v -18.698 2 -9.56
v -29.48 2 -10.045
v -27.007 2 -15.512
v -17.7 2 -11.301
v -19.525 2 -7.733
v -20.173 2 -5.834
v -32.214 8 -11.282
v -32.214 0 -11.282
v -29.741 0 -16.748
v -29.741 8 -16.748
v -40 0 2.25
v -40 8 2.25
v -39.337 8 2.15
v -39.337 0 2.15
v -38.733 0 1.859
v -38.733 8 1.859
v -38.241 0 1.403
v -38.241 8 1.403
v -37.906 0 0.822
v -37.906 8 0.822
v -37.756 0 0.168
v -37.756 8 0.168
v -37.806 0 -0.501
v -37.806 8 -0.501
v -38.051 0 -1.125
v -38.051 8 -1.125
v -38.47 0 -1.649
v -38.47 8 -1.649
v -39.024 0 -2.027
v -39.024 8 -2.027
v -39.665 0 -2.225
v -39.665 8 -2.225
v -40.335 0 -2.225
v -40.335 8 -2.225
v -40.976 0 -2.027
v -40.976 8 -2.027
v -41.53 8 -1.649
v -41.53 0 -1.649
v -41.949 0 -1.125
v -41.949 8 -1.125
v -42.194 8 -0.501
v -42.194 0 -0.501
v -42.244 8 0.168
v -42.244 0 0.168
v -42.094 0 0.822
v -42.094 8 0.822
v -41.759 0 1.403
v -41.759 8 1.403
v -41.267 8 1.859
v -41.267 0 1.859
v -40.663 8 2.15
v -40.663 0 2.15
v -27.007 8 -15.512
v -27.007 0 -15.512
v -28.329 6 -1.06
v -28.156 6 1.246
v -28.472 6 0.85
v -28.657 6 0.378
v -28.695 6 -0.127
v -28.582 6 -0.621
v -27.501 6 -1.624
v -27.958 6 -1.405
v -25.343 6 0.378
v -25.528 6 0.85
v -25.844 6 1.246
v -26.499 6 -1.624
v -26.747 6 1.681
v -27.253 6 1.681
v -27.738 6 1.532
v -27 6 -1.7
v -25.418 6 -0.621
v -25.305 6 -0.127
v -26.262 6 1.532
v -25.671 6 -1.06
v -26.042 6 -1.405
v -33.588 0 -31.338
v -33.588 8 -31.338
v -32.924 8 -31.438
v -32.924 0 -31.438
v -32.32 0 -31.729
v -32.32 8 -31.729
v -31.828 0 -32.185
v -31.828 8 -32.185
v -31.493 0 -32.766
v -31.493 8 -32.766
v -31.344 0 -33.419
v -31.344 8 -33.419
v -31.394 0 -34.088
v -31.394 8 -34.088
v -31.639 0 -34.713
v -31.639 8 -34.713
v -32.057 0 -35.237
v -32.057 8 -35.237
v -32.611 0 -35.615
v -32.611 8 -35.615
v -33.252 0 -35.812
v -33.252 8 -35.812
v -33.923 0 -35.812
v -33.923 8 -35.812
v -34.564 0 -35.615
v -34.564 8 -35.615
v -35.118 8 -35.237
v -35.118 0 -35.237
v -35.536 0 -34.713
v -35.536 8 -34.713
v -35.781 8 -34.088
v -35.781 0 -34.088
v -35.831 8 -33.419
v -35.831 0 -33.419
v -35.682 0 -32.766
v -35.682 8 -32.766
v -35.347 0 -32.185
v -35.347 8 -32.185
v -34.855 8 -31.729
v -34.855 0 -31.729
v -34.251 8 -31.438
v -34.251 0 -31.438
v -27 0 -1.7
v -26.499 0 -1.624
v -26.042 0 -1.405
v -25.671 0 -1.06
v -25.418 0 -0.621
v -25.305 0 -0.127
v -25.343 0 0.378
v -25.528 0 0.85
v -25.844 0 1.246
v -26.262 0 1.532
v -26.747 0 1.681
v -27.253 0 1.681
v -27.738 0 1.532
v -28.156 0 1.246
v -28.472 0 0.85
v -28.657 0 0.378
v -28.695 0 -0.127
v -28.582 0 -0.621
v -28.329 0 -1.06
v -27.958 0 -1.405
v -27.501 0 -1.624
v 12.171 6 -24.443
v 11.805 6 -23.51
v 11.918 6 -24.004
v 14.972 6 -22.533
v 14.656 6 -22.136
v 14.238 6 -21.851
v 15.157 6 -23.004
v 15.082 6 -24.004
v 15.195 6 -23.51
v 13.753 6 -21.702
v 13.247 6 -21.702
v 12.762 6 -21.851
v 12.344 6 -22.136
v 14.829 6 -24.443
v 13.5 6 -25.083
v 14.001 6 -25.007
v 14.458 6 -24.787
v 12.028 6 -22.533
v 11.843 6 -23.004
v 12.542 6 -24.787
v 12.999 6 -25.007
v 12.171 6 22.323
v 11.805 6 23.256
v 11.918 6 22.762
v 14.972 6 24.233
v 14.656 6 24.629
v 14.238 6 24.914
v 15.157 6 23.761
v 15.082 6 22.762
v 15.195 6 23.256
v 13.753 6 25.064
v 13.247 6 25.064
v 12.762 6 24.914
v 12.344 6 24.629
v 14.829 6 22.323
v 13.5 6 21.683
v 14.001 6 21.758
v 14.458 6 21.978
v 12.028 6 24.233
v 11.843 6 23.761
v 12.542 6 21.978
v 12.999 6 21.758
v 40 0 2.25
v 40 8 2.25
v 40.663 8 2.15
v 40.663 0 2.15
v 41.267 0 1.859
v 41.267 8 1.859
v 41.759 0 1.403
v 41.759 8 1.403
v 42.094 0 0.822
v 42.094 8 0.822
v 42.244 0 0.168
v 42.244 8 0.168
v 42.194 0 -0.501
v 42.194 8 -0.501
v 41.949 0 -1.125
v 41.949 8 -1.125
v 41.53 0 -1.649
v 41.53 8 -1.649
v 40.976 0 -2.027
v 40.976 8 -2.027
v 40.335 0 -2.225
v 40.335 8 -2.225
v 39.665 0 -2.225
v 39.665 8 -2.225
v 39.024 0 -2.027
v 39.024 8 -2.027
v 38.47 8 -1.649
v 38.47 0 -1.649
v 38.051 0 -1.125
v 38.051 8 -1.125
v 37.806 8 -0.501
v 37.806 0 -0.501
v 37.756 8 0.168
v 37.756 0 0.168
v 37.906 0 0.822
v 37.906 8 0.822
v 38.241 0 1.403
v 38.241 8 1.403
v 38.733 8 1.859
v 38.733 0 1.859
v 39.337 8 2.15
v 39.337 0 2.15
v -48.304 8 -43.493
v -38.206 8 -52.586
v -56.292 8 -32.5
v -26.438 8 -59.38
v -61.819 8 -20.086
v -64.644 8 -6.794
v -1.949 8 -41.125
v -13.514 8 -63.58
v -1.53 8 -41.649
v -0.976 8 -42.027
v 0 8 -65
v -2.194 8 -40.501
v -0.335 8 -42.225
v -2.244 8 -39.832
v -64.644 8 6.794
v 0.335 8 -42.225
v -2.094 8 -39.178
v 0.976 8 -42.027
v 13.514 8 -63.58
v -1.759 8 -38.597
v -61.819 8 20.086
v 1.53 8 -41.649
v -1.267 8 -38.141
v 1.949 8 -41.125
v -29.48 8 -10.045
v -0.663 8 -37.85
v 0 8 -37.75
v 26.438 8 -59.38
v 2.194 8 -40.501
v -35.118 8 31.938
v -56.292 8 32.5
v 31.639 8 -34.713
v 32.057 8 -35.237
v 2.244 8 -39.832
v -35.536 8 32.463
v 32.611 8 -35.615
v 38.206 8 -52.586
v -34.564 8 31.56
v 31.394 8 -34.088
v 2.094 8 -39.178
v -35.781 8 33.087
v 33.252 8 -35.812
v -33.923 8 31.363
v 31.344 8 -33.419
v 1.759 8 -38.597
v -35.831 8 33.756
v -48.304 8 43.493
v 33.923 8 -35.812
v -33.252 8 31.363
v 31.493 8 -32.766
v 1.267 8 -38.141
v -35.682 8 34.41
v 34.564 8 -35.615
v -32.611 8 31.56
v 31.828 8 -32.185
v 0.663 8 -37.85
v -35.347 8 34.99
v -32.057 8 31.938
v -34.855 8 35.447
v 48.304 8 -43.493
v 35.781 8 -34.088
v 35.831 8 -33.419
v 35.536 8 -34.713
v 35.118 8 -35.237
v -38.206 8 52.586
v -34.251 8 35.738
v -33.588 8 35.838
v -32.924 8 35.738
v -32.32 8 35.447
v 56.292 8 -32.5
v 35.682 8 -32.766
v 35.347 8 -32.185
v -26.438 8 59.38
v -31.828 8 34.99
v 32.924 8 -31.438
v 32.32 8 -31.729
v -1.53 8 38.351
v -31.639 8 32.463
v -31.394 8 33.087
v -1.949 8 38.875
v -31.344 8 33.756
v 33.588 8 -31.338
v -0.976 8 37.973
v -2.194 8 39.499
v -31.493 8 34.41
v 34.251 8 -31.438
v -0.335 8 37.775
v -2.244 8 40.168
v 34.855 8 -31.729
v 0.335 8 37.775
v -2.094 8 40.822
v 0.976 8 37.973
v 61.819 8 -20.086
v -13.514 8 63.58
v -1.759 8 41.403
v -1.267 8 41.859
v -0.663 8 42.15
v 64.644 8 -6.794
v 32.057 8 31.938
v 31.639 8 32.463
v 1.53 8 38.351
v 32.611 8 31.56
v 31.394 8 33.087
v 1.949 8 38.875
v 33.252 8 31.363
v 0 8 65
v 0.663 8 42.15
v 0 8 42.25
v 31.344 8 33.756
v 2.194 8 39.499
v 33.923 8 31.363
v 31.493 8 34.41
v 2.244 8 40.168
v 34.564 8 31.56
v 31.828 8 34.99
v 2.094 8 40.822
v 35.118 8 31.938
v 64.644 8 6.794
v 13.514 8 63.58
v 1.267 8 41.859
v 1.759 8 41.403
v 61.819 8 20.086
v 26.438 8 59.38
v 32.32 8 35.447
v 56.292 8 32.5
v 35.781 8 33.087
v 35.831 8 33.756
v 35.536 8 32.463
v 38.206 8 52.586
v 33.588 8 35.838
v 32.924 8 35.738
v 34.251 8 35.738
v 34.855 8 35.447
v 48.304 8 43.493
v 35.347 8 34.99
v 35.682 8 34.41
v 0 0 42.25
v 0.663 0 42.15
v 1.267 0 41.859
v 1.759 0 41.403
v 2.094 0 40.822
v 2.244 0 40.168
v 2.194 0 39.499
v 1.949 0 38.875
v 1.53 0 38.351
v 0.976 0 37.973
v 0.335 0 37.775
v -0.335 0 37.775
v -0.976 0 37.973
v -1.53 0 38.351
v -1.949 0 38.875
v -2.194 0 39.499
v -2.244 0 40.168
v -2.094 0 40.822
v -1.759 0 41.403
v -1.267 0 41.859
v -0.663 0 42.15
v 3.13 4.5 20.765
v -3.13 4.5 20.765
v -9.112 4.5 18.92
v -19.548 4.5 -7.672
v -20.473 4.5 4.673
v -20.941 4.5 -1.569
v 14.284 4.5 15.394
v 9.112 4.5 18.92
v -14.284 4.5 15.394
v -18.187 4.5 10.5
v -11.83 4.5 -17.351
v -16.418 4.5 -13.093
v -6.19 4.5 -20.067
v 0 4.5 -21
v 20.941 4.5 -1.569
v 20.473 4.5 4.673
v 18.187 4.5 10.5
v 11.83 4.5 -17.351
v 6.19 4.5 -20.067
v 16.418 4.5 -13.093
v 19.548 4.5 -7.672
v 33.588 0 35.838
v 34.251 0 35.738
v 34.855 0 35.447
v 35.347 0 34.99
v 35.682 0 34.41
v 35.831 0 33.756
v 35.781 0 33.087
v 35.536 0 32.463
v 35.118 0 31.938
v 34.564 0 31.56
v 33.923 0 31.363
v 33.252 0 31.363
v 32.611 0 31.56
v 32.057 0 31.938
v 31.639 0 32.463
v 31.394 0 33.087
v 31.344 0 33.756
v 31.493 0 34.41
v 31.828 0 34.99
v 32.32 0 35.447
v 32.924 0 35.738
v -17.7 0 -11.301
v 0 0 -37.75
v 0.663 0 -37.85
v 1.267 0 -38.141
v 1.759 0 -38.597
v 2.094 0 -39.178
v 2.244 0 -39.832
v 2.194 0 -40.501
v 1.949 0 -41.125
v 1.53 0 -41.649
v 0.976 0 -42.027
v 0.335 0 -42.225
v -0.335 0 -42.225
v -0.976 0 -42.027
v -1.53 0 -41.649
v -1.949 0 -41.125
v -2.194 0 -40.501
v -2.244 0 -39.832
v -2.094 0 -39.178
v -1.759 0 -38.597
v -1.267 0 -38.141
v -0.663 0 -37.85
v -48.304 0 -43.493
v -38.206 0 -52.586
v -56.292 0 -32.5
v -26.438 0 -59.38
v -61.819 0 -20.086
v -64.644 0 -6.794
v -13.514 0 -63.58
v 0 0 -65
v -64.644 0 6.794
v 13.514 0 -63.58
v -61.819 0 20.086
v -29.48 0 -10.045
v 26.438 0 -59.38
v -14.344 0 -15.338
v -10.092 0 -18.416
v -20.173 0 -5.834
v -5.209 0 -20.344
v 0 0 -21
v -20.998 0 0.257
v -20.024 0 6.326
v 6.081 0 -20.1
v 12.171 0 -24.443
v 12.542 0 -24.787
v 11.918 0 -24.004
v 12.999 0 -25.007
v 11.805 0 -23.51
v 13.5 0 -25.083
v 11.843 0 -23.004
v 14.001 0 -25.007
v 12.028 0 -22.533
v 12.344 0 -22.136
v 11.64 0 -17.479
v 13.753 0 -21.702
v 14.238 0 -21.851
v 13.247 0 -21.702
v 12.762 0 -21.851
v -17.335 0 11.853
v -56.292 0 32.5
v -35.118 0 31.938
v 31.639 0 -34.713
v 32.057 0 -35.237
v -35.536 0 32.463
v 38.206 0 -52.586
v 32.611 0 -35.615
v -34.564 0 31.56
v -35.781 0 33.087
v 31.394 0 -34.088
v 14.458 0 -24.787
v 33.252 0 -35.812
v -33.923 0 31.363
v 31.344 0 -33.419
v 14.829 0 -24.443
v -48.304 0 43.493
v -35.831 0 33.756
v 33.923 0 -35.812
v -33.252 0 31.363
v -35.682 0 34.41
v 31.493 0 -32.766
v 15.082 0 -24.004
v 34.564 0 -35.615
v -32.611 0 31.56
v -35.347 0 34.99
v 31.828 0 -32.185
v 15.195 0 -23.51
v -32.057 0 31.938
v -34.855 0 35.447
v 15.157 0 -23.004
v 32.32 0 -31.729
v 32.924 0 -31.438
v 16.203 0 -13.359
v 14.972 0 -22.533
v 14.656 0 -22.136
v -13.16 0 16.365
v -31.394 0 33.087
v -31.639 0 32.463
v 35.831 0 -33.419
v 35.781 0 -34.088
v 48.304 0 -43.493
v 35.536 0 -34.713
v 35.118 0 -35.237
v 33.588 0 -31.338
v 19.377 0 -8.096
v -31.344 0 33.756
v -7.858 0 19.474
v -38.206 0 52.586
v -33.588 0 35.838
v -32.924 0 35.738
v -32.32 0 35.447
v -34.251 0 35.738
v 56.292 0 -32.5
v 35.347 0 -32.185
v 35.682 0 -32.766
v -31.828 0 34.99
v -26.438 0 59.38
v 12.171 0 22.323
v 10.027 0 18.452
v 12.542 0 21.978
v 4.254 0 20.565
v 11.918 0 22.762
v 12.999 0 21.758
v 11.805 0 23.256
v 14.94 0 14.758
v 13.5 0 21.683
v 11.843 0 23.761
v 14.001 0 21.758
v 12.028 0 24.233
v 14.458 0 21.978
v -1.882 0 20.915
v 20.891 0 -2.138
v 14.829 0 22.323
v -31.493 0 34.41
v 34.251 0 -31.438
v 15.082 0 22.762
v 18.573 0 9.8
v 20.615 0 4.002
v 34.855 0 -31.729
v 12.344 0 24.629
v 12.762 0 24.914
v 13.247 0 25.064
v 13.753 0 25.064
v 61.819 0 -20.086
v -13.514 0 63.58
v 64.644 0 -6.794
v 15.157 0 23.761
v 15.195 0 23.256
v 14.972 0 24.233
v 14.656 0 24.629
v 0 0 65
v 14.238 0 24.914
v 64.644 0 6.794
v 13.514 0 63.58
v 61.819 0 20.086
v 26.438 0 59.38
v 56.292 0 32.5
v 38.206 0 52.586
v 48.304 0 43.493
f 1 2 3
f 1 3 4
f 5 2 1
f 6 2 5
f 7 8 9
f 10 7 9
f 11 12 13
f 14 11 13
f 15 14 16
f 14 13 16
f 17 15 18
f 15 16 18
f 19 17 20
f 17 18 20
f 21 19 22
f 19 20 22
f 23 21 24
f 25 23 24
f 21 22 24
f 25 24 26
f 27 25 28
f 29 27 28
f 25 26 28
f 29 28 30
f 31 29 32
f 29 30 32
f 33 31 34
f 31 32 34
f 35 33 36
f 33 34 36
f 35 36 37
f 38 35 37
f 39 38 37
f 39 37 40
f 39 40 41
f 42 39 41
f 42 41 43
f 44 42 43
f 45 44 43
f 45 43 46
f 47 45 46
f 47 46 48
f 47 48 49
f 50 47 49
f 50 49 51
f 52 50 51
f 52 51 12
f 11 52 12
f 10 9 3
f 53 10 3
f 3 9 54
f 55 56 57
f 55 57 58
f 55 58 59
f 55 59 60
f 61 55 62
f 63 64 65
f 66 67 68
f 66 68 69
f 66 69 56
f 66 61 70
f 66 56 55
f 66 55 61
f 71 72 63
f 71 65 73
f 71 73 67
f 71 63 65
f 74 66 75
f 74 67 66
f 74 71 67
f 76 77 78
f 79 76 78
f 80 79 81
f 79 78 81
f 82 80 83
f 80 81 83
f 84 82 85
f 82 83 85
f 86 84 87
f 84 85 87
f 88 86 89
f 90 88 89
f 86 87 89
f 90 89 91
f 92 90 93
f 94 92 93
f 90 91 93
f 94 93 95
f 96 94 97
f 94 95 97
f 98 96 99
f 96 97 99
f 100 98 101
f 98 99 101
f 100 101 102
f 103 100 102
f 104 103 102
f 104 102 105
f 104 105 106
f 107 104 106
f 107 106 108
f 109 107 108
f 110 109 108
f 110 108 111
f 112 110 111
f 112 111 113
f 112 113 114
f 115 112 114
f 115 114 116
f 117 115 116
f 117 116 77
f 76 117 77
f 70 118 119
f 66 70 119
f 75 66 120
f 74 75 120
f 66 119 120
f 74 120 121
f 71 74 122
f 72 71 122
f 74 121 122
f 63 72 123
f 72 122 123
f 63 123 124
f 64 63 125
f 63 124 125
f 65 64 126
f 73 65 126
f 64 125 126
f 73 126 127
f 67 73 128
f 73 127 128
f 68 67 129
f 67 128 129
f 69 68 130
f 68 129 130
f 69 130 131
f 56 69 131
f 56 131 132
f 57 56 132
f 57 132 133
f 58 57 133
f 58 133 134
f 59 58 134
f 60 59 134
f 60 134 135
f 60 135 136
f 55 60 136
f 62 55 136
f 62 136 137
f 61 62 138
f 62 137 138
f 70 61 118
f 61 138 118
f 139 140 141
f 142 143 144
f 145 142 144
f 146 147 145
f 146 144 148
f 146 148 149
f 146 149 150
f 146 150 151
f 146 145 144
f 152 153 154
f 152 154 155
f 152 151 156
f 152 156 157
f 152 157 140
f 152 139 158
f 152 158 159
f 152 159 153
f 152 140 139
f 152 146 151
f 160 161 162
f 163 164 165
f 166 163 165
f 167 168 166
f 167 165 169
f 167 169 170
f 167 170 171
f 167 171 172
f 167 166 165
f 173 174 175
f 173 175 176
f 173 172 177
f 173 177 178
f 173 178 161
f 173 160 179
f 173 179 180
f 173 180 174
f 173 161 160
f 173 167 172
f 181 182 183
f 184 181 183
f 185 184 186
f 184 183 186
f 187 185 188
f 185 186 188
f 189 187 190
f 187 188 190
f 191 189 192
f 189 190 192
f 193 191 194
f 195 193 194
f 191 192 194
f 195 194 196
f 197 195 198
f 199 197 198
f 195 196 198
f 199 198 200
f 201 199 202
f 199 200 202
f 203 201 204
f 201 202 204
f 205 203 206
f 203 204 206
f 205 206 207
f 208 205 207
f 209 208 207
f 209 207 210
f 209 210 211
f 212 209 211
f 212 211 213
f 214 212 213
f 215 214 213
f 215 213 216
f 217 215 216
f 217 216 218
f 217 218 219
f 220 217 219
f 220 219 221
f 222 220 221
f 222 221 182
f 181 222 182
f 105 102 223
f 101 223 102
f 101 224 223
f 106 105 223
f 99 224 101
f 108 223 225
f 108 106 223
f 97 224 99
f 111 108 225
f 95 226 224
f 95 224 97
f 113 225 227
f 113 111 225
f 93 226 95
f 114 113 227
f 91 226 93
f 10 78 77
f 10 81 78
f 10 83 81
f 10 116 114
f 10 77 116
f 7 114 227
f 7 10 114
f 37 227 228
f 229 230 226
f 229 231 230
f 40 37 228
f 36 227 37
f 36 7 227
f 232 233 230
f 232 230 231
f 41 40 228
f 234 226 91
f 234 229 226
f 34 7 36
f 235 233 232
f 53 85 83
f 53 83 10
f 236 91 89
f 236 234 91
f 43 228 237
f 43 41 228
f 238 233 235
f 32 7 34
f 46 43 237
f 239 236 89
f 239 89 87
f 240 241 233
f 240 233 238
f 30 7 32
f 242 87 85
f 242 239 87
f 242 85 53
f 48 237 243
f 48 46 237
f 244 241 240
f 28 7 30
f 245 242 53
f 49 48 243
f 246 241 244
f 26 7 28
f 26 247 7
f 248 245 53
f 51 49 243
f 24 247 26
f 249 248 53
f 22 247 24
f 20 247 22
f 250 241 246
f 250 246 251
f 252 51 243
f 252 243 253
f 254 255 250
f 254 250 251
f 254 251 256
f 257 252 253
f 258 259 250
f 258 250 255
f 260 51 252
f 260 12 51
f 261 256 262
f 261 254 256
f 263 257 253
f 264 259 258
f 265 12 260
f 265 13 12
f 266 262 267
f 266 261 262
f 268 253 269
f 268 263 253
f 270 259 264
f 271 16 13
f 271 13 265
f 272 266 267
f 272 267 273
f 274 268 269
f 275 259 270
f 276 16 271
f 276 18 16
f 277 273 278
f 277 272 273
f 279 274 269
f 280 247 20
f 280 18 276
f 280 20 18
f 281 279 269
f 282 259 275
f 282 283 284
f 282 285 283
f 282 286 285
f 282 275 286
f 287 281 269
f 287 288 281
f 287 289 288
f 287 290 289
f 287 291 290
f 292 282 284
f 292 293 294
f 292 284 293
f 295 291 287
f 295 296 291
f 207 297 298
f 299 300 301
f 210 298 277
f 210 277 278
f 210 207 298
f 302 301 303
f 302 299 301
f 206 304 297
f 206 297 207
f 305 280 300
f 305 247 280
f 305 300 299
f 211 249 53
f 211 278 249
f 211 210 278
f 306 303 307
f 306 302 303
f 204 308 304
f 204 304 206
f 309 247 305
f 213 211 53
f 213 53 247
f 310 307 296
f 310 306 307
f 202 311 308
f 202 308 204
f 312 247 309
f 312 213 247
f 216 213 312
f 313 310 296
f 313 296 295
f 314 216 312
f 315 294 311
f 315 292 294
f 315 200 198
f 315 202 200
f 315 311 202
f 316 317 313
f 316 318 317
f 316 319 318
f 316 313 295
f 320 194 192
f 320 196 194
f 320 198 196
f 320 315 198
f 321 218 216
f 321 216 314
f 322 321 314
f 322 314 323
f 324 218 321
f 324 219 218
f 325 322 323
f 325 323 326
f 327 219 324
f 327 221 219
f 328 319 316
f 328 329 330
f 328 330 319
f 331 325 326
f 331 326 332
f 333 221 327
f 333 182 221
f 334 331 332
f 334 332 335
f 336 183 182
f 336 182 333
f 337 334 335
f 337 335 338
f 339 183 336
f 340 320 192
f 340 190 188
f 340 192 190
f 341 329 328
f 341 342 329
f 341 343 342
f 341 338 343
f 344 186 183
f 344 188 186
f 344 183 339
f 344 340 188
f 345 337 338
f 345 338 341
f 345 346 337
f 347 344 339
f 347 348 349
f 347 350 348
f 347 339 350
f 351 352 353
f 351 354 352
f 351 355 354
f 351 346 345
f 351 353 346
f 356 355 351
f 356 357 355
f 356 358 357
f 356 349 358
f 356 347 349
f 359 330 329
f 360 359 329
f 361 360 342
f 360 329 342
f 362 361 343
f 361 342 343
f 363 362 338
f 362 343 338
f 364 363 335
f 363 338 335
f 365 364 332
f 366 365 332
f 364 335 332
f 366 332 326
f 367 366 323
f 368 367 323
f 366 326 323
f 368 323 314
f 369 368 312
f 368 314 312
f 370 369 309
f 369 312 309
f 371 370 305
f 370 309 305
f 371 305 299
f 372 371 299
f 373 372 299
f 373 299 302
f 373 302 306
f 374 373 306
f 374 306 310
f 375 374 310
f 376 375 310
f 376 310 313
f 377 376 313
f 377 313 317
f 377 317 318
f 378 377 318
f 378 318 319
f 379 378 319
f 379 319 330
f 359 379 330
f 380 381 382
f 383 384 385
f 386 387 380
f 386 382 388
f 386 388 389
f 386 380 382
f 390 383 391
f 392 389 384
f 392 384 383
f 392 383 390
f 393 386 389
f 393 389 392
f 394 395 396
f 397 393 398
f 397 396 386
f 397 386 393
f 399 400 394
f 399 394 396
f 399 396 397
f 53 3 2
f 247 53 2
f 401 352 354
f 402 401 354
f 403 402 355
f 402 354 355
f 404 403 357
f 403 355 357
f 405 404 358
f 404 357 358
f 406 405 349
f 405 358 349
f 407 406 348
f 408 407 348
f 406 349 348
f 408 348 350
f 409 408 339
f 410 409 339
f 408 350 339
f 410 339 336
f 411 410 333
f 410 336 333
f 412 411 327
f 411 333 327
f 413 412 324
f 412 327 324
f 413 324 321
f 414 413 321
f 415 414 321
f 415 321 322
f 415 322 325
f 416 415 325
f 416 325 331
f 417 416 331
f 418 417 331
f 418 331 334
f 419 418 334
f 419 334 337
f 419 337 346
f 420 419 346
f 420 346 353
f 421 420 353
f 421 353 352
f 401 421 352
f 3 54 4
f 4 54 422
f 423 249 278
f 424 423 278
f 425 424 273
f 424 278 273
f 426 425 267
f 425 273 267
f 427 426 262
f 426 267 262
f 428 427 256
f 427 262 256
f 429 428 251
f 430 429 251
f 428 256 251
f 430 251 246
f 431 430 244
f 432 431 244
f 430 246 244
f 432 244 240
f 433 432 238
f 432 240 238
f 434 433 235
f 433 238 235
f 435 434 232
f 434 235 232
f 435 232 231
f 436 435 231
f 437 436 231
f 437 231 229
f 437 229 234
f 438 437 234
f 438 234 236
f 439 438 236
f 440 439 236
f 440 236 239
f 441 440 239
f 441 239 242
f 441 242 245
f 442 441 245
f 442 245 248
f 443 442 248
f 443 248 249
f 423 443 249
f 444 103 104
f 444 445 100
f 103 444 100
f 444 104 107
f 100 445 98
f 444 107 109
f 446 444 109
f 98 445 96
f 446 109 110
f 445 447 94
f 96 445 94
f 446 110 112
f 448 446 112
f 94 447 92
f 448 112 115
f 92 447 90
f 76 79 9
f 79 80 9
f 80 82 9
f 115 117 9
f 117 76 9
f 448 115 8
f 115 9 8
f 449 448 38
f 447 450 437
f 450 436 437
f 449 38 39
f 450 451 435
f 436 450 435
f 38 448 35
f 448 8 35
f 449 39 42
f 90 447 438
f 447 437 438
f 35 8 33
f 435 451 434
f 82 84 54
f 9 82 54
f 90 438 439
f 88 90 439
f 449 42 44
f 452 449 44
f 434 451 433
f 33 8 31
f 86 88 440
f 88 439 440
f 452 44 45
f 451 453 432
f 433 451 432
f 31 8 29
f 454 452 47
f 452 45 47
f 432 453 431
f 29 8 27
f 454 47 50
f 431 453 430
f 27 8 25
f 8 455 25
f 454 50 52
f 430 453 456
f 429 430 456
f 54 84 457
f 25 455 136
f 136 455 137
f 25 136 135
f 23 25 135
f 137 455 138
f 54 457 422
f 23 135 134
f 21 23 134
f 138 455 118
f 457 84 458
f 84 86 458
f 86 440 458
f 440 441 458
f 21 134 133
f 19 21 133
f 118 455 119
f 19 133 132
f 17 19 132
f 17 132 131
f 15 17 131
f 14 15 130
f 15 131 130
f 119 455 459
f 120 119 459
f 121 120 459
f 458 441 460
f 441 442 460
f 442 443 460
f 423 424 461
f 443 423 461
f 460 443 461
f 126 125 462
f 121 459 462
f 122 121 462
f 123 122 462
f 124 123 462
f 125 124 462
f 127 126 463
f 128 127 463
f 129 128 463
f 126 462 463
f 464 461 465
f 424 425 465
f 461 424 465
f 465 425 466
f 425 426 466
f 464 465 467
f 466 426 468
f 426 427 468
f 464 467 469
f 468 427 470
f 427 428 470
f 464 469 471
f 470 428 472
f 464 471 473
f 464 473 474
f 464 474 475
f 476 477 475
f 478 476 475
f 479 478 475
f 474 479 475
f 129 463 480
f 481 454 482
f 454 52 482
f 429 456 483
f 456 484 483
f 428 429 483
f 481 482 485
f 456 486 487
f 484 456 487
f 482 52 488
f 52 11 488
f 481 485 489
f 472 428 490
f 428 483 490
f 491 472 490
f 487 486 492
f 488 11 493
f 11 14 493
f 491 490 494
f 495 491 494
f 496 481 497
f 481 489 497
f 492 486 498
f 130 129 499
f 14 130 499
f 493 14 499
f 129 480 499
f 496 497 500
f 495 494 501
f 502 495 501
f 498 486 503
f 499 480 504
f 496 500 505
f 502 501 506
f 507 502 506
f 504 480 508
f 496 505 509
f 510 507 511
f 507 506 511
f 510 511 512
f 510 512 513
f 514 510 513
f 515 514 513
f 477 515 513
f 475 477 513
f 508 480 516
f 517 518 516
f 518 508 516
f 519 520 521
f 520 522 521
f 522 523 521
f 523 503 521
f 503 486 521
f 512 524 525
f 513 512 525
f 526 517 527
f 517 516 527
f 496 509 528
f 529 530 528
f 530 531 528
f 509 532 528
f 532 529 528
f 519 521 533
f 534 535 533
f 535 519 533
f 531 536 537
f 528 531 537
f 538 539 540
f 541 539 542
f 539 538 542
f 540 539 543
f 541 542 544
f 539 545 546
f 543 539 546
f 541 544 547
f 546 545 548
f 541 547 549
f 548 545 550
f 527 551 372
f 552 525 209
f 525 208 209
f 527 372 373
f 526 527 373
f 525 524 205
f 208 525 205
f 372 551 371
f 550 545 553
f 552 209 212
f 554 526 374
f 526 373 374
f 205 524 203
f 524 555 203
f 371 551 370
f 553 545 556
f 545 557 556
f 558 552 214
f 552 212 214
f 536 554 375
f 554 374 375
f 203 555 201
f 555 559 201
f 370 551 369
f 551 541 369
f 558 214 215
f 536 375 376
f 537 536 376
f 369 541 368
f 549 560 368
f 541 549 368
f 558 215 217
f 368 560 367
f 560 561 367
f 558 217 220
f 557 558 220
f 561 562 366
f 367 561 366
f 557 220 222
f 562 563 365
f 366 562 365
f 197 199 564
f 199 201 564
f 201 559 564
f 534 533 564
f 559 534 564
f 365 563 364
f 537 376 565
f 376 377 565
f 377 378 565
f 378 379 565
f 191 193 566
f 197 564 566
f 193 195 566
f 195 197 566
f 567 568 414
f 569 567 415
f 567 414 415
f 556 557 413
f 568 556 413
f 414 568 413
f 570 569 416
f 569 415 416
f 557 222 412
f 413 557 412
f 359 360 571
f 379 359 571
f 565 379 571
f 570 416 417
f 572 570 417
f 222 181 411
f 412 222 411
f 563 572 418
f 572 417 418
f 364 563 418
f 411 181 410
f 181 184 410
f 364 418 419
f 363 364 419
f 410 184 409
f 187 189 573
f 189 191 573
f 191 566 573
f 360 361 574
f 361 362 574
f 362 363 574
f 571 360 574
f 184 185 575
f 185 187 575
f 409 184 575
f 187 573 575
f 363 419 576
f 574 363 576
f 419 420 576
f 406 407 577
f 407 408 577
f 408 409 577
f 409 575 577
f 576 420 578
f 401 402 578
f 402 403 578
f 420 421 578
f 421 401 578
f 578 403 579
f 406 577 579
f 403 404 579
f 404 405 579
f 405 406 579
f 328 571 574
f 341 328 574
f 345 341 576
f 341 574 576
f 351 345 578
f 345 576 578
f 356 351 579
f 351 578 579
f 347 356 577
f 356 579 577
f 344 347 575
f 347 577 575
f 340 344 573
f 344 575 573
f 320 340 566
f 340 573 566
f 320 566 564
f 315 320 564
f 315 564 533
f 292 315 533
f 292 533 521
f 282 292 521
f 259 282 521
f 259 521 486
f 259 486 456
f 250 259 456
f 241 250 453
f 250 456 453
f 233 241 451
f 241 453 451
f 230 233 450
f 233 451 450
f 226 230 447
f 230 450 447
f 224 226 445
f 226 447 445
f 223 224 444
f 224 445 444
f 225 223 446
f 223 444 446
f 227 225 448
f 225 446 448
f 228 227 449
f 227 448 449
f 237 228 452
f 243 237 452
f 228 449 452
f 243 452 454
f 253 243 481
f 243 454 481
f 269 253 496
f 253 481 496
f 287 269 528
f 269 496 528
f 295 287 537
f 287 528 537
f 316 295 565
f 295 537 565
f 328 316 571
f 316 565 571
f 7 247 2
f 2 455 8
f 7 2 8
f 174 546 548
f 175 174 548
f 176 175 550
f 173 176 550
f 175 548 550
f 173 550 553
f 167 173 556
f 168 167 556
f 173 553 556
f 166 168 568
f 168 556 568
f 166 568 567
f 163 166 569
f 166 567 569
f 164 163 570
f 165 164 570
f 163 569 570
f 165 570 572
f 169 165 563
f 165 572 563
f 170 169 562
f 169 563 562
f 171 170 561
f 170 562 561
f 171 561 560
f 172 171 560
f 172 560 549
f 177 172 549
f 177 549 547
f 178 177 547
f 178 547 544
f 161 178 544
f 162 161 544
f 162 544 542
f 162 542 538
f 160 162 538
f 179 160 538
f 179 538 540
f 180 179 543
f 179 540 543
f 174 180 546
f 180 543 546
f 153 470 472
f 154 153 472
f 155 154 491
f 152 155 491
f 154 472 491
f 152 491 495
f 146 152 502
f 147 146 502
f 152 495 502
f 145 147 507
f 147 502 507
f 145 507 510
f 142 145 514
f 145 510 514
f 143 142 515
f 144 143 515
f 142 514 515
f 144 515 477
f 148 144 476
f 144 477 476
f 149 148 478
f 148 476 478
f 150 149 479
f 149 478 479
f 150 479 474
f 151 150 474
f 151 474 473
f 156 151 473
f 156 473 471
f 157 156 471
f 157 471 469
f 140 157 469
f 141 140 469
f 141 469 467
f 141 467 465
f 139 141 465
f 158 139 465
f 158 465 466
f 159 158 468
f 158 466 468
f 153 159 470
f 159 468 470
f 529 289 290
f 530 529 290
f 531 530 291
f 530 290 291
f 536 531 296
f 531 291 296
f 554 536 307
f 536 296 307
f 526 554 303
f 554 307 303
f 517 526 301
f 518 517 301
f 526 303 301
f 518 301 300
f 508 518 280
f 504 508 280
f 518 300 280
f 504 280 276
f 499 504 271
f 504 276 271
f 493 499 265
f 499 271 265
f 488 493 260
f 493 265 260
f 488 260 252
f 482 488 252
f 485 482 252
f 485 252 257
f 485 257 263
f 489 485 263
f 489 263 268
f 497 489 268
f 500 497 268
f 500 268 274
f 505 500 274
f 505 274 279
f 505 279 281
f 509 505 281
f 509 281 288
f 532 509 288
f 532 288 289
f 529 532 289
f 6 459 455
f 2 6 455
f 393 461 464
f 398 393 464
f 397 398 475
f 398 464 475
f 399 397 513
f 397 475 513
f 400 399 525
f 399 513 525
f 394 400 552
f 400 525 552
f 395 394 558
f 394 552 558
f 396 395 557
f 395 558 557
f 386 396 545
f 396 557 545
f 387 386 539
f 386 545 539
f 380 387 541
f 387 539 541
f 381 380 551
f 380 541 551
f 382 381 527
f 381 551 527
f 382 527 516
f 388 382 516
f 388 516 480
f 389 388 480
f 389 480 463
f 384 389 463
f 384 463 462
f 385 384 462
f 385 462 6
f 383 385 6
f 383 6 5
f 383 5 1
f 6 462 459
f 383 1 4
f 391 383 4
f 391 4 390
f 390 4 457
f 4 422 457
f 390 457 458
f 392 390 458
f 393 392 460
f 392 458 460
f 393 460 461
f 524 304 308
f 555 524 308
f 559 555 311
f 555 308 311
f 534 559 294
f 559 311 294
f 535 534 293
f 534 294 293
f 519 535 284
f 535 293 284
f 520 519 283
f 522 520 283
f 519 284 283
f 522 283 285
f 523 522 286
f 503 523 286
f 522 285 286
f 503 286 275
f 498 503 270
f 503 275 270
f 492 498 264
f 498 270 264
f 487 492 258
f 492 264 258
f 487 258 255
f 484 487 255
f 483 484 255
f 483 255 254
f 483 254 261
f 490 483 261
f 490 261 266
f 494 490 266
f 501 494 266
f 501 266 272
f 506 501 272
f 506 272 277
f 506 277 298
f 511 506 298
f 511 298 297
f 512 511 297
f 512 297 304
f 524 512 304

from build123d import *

# Parameters (mm, degrees)
SKETCH2_R           = 65
BOSS_EXTRUDE1_DEPTH = 8
SKETCH3_R           = 21
CUT_EXTRUDE1_DEPTH  = 4.5
SKETCH4_R           = 2.25
CUT_EXTRUDE2_DEPTH  = 93.271338995
SKETCH5_R           = 2.25
CUT_EXTRUDE3_DEPTH  = 93.271338995
PATH_TRENCH_DEPTH   = 2
CDG_R               = 1.7
CDG_CUT_DEPTH       = 6
CUT_EXTRUDE4_DEPTH  = 93.271338995


with BuildPart() as part:
    # Sketch2 → Boss-Extrude1 (new body)
    with BuildSketch(Plane(origin=(0, 0, 0), x_dir=(1, 0, 0), z_dir=(0, 1, 0))):
        with Locations(Location((0, 0, 0), (0, 0, 270))):
            Circle(SKETCH2_R)
    extrude(amount=BOSS_EXTRUDE1_DEPTH)

    # Sketch3 → Cut-Extrude1 (cut)
    with BuildSketch(Plane.XZ):
        with Locations(Location((0, 0, 0), (0, 0, 270))):
            Circle(SKETCH3_R)
    extrude(amount=-CUT_EXTRUDE1_DEPTH, mode=Mode.SUBTRACT)

    # Sketch4 → Cut-Extrude2 (cut, through all)
    with BuildSketch(Plane(origin=(0, 8, 0), x_dir=(1, 0, 0), z_dir=(0, 1, 0))):
        with Locations(Location((-40, 0, 0), (0, 0, 270))):
            Circle(SKETCH4_R)
        with Locations(Location((0, 40, 0), (0, 0, 270))):
            Circle(SKETCH4_R)
        with Locations(Location((40, 0, 0), (0, 0, 270))):
            Circle(SKETCH4_R)
        with Locations(Location((0, -40, 0), (0, 0, 270))):
            Circle(SKETCH4_R)
    extrude(amount=-CUT_EXTRUDE2_DEPTH, mode=Mode.SUBTRACT)

    # Sketch5 → Cut-Extrude3 (cut, through all)
    with BuildSketch(Plane(origin=(0, 8, 0), x_dir=(1, 0, 0), z_dir=(0, 1, 0))):
        with Locations(Location((-33.587572106, 33.587572106, 0), (0, 0, 270))):
            Circle(SKETCH5_R)
        with Locations(Location((33.587572106, 33.587572106, 0), (0, 0, 270))):
            Circle(SKETCH5_R)
        with Locations(Location((33.587572106, -33.587572106, 0), (0, 0, 270))):
            Circle(SKETCH5_R)
        with Locations(Location((-33.587572106, -33.587572106, 0), (0, 0, 270))):
            Circle(SKETCH5_R)
    extrude(amount=-CUT_EXTRUDE3_DEPTH, mode=Mode.SUBTRACT)

    # Sketch6 → path_trench (cut)
    with BuildSketch(Plane.XZ):
        Polygon((-29.480467623, -10.045000187), (-27.007252724, -15.511553769), (-16.07414556, -10.565123971), (-18.547360459, -5.098570389), align=None)
    extrude(amount=-PATH_TRENCH_DEPTH, mode=Mode.SUBTRACT)

    # CDG → CDG_CUT (cut)
    with BuildSketch(Plane.XZ):
        with Locations(Location((-27, 0, 0), (0, 0, 270))):
            Circle(CDG_R)
        with Locations(Location((13.5, 23.382685902, 0), (0, 0, 270))):
            Circle(CDG_R)
        with Locations(Location((13.5, -23.382685902, 0), (0, 0, 270))):
            Circle(CDG_R)
    extrude(amount=-CDG_CUT_DEPTH, mode=Mode.SUBTRACT)

    # Sketch7 → Cut-Extrude4 (cut, through all)
    with BuildSketch(Plane.XZ):
        Polygon((-29.480467623, -10.045000187), (-32.213744414, -11.281607636), (-29.740529515, -16.748161218), (-27.007252724, -15.511553769), align=None)
    extrude(amount=-CUT_EXTRUDE4_DEPTH, mode=Mode.SUBTRACT)


solid = part.part
